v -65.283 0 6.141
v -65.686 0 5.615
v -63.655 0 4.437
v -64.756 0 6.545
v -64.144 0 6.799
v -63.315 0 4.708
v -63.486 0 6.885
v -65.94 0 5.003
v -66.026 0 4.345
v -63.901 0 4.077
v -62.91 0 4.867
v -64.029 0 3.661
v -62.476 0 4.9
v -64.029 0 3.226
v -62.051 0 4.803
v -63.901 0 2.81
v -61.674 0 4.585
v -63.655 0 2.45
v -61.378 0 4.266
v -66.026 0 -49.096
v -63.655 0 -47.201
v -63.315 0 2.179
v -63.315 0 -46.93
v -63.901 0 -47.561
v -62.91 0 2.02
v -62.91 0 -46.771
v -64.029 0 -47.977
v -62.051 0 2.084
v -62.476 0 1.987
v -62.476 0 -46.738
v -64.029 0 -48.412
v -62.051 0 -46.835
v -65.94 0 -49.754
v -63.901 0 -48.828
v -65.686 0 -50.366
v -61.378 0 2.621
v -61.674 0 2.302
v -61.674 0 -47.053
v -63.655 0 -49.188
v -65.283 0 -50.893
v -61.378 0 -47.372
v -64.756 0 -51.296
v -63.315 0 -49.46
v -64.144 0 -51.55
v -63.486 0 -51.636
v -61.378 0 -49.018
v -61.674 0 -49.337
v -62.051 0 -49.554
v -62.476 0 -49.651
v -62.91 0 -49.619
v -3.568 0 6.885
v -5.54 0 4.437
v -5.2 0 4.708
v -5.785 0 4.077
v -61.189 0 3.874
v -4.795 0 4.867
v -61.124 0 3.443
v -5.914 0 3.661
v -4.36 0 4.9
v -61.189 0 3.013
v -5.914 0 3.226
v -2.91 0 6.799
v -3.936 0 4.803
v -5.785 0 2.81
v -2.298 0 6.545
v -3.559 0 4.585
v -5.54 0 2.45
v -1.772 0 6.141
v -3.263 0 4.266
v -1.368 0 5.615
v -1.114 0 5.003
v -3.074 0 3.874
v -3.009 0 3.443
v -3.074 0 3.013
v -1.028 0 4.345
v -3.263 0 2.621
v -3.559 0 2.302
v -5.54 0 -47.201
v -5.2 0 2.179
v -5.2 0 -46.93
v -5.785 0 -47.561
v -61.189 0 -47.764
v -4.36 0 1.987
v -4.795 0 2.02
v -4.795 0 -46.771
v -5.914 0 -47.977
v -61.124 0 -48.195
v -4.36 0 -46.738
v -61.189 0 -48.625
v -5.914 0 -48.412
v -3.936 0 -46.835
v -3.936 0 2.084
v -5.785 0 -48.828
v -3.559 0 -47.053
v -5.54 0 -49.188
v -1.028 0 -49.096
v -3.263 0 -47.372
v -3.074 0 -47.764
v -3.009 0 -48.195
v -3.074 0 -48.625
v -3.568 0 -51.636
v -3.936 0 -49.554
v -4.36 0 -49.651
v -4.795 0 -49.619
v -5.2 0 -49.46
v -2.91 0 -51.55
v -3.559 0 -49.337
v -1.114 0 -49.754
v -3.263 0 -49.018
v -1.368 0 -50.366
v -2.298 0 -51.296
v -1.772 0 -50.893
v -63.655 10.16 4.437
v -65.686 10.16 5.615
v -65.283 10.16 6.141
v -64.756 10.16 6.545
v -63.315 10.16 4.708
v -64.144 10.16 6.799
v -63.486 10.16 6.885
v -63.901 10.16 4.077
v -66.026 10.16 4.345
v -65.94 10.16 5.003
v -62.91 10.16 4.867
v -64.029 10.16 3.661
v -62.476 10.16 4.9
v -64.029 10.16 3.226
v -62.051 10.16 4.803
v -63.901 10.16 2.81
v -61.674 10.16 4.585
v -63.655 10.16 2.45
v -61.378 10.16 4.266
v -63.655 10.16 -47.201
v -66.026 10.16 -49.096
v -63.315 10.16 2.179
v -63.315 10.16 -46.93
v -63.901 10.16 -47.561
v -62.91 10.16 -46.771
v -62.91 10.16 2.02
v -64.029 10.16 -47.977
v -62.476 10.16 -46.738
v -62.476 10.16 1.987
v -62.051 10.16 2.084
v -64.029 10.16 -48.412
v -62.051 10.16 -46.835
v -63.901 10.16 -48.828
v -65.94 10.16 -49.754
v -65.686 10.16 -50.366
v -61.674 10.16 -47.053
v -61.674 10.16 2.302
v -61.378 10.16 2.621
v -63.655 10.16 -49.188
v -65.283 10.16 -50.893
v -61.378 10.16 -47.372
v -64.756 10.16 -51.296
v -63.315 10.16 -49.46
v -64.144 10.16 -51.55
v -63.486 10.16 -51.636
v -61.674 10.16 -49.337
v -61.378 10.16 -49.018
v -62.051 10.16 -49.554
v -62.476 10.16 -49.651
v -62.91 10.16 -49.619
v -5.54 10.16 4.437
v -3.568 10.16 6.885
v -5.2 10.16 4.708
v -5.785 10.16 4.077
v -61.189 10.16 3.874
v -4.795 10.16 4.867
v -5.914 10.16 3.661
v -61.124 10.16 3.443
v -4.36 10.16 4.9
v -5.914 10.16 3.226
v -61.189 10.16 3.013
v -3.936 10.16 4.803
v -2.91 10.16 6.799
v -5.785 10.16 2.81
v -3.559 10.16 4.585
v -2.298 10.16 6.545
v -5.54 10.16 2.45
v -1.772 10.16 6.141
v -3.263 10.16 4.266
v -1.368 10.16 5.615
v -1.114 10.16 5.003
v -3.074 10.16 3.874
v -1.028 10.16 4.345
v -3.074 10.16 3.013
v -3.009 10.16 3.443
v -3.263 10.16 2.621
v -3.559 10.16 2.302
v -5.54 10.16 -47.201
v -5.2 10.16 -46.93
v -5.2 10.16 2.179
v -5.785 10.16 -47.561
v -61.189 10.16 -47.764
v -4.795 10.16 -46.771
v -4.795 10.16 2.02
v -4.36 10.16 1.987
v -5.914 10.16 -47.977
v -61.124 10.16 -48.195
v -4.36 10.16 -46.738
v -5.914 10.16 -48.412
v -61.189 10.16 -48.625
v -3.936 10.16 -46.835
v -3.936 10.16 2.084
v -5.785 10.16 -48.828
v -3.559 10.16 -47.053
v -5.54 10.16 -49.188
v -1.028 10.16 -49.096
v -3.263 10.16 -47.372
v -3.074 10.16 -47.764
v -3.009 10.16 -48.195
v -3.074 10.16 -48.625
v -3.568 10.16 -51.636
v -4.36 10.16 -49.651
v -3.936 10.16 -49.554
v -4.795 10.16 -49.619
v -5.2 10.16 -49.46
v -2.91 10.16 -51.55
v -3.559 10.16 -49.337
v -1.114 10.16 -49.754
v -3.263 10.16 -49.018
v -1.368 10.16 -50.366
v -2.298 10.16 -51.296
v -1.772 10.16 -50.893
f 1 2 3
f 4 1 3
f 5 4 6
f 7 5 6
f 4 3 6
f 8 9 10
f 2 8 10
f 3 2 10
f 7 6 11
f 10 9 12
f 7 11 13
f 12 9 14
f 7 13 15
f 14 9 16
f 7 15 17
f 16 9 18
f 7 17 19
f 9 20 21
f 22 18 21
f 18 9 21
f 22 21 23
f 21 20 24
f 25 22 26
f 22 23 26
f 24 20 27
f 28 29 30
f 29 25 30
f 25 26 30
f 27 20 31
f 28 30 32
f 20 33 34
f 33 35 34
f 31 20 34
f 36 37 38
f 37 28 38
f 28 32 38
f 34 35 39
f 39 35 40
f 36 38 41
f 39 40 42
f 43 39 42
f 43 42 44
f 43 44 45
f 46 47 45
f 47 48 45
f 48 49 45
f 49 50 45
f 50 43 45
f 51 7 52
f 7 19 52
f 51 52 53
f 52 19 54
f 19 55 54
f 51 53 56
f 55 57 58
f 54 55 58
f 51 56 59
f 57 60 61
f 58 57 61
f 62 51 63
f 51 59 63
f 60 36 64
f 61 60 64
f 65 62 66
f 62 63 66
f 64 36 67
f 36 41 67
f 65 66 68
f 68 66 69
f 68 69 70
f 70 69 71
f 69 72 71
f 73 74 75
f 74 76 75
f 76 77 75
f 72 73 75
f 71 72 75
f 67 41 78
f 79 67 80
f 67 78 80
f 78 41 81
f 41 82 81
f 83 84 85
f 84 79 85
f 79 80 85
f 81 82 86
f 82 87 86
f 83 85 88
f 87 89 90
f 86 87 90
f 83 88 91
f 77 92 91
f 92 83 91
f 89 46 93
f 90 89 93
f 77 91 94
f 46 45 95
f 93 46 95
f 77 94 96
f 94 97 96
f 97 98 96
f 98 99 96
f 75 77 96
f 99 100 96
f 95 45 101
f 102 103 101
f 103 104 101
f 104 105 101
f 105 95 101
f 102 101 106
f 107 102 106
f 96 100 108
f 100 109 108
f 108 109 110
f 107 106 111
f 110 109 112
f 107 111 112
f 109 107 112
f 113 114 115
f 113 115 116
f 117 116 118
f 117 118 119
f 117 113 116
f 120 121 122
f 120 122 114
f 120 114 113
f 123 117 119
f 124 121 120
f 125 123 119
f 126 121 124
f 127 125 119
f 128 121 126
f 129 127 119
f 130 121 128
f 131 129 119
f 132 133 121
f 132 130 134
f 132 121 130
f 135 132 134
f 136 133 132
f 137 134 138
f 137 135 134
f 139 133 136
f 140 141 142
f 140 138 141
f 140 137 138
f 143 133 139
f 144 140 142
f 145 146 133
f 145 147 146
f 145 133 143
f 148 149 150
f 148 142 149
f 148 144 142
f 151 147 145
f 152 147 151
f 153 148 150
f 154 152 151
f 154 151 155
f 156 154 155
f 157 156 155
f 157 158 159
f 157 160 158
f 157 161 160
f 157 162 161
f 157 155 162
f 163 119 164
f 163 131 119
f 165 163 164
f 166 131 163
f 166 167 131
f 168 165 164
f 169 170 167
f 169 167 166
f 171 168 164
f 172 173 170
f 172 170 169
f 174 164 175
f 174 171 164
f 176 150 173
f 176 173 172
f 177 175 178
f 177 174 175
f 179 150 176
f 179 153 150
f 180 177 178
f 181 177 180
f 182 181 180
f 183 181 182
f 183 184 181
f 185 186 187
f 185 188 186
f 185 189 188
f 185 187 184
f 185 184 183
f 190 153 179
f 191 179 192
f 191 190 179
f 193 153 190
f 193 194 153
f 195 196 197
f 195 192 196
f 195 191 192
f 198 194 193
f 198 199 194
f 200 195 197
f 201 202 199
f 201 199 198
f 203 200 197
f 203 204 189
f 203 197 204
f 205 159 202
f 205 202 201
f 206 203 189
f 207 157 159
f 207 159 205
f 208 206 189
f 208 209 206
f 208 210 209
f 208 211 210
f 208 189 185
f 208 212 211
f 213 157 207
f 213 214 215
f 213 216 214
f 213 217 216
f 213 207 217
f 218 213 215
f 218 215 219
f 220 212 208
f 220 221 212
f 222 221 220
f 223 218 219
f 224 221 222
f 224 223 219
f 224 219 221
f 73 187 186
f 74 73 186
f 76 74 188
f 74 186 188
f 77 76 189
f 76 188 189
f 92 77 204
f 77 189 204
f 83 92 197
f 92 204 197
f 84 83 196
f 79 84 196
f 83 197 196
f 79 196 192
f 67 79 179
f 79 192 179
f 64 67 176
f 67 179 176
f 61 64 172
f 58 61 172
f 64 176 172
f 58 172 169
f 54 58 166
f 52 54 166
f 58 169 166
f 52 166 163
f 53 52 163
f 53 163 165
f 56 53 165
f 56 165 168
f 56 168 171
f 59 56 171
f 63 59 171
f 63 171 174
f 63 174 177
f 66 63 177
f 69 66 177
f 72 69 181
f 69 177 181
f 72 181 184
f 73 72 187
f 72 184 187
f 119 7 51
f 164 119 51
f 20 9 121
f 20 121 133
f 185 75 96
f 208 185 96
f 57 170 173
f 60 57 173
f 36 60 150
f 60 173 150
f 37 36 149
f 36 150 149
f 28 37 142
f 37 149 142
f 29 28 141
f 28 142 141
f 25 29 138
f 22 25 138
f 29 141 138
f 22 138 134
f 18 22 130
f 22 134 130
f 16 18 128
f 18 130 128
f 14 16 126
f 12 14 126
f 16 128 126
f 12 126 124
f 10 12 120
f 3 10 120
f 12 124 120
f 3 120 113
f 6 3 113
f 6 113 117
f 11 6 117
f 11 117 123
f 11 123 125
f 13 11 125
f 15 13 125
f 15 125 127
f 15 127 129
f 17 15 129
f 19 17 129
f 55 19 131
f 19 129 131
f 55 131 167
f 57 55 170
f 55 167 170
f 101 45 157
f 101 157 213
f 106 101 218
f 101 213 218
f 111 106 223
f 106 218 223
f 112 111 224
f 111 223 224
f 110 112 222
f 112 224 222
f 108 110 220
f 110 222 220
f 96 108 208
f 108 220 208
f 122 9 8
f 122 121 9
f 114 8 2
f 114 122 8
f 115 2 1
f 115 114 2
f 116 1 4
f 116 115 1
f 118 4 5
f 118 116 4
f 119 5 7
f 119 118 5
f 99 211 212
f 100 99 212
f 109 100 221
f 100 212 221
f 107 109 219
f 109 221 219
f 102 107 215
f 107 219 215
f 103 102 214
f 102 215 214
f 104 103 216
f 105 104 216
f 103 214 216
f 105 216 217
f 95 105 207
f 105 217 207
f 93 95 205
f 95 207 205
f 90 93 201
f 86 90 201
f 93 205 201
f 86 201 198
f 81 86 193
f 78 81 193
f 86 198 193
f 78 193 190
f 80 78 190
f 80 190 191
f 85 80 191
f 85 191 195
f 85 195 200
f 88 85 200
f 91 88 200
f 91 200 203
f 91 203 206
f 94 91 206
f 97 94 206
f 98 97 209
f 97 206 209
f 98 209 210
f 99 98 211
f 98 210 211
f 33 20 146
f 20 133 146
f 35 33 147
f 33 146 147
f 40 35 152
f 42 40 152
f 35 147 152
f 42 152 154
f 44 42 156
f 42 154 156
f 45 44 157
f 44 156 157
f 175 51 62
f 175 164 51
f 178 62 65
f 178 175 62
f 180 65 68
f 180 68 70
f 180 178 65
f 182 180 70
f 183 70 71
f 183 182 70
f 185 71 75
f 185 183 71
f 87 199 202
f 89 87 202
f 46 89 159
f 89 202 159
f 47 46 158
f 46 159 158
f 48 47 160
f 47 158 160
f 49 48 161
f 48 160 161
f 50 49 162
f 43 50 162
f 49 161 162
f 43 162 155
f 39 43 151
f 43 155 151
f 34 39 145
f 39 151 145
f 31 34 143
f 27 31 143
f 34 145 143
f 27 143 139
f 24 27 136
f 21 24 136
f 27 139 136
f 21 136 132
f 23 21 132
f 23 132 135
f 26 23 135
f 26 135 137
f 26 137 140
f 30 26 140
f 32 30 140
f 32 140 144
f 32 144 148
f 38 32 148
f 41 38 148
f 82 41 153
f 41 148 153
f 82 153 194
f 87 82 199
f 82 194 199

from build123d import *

# Parameters (mm, degrees)
SKETCH1_W           = 64.9986
SKETCH1_H           = 58.5216
BOSS_EXTRUDE1_DEPTH = 10.16
SKETCH2_R           = 1.4605
CUT_EXTRUDE1_DEPTH  = 10.16
FILLET1_R           = 2.54


with BuildPart() as part:
    # Sketch1 → Boss-Extrude1 (new body)
    with BuildSketch(Plane(origin=(0, 0, 0), x_dir=(1, 0, 0), z_dir=(0, 1, 0))):
        with Locations((-33.527176718, 22.375686118)):
            Rectangle(SKETCH1_W, SKETCH1_H)
    extrude(amount=BOSS_EXTRUDE1_DEPTH)

    # Sketch2 → Cut-Extrude1 (cut)
    with BuildSketch(Plane(origin=(0, 10.16, 0), x_dir=(1, 0, 0), z_dir=(0, 1, 0))):
        with Locations((-4.469576718, -3.443413882)):
            Circle(SKETCH2_R)
        with Locations((-4.469576718, 48.194786118)):
            Circle(SKETCH2_R)
        with Locations((-62.584776718, 48.194786118)):
            Circle(SKETCH2_R)
        with Locations((-62.584776718, -3.443413882)):
            Circle(SKETCH2_R)
    extrude(amount=-CUT_EXTRUDE1_DEPTH, mode=Mode.SUBTRACT)

    # Fillet1
    fillet1_edges = [part.edges().sort_by_distance(p)[0] for p in [
        (-66.026476718, 5.08, -51.636486118),
        (-1.027876718, 5.08, -51.636486118),
        (-1.027876718, 5.08, 6.885113882),
        (-66.026476718, 5.08, 6.885113882),
    ]]
    fillet(fillet1_edges, radius=FILLET1_R)


solid = part.part
